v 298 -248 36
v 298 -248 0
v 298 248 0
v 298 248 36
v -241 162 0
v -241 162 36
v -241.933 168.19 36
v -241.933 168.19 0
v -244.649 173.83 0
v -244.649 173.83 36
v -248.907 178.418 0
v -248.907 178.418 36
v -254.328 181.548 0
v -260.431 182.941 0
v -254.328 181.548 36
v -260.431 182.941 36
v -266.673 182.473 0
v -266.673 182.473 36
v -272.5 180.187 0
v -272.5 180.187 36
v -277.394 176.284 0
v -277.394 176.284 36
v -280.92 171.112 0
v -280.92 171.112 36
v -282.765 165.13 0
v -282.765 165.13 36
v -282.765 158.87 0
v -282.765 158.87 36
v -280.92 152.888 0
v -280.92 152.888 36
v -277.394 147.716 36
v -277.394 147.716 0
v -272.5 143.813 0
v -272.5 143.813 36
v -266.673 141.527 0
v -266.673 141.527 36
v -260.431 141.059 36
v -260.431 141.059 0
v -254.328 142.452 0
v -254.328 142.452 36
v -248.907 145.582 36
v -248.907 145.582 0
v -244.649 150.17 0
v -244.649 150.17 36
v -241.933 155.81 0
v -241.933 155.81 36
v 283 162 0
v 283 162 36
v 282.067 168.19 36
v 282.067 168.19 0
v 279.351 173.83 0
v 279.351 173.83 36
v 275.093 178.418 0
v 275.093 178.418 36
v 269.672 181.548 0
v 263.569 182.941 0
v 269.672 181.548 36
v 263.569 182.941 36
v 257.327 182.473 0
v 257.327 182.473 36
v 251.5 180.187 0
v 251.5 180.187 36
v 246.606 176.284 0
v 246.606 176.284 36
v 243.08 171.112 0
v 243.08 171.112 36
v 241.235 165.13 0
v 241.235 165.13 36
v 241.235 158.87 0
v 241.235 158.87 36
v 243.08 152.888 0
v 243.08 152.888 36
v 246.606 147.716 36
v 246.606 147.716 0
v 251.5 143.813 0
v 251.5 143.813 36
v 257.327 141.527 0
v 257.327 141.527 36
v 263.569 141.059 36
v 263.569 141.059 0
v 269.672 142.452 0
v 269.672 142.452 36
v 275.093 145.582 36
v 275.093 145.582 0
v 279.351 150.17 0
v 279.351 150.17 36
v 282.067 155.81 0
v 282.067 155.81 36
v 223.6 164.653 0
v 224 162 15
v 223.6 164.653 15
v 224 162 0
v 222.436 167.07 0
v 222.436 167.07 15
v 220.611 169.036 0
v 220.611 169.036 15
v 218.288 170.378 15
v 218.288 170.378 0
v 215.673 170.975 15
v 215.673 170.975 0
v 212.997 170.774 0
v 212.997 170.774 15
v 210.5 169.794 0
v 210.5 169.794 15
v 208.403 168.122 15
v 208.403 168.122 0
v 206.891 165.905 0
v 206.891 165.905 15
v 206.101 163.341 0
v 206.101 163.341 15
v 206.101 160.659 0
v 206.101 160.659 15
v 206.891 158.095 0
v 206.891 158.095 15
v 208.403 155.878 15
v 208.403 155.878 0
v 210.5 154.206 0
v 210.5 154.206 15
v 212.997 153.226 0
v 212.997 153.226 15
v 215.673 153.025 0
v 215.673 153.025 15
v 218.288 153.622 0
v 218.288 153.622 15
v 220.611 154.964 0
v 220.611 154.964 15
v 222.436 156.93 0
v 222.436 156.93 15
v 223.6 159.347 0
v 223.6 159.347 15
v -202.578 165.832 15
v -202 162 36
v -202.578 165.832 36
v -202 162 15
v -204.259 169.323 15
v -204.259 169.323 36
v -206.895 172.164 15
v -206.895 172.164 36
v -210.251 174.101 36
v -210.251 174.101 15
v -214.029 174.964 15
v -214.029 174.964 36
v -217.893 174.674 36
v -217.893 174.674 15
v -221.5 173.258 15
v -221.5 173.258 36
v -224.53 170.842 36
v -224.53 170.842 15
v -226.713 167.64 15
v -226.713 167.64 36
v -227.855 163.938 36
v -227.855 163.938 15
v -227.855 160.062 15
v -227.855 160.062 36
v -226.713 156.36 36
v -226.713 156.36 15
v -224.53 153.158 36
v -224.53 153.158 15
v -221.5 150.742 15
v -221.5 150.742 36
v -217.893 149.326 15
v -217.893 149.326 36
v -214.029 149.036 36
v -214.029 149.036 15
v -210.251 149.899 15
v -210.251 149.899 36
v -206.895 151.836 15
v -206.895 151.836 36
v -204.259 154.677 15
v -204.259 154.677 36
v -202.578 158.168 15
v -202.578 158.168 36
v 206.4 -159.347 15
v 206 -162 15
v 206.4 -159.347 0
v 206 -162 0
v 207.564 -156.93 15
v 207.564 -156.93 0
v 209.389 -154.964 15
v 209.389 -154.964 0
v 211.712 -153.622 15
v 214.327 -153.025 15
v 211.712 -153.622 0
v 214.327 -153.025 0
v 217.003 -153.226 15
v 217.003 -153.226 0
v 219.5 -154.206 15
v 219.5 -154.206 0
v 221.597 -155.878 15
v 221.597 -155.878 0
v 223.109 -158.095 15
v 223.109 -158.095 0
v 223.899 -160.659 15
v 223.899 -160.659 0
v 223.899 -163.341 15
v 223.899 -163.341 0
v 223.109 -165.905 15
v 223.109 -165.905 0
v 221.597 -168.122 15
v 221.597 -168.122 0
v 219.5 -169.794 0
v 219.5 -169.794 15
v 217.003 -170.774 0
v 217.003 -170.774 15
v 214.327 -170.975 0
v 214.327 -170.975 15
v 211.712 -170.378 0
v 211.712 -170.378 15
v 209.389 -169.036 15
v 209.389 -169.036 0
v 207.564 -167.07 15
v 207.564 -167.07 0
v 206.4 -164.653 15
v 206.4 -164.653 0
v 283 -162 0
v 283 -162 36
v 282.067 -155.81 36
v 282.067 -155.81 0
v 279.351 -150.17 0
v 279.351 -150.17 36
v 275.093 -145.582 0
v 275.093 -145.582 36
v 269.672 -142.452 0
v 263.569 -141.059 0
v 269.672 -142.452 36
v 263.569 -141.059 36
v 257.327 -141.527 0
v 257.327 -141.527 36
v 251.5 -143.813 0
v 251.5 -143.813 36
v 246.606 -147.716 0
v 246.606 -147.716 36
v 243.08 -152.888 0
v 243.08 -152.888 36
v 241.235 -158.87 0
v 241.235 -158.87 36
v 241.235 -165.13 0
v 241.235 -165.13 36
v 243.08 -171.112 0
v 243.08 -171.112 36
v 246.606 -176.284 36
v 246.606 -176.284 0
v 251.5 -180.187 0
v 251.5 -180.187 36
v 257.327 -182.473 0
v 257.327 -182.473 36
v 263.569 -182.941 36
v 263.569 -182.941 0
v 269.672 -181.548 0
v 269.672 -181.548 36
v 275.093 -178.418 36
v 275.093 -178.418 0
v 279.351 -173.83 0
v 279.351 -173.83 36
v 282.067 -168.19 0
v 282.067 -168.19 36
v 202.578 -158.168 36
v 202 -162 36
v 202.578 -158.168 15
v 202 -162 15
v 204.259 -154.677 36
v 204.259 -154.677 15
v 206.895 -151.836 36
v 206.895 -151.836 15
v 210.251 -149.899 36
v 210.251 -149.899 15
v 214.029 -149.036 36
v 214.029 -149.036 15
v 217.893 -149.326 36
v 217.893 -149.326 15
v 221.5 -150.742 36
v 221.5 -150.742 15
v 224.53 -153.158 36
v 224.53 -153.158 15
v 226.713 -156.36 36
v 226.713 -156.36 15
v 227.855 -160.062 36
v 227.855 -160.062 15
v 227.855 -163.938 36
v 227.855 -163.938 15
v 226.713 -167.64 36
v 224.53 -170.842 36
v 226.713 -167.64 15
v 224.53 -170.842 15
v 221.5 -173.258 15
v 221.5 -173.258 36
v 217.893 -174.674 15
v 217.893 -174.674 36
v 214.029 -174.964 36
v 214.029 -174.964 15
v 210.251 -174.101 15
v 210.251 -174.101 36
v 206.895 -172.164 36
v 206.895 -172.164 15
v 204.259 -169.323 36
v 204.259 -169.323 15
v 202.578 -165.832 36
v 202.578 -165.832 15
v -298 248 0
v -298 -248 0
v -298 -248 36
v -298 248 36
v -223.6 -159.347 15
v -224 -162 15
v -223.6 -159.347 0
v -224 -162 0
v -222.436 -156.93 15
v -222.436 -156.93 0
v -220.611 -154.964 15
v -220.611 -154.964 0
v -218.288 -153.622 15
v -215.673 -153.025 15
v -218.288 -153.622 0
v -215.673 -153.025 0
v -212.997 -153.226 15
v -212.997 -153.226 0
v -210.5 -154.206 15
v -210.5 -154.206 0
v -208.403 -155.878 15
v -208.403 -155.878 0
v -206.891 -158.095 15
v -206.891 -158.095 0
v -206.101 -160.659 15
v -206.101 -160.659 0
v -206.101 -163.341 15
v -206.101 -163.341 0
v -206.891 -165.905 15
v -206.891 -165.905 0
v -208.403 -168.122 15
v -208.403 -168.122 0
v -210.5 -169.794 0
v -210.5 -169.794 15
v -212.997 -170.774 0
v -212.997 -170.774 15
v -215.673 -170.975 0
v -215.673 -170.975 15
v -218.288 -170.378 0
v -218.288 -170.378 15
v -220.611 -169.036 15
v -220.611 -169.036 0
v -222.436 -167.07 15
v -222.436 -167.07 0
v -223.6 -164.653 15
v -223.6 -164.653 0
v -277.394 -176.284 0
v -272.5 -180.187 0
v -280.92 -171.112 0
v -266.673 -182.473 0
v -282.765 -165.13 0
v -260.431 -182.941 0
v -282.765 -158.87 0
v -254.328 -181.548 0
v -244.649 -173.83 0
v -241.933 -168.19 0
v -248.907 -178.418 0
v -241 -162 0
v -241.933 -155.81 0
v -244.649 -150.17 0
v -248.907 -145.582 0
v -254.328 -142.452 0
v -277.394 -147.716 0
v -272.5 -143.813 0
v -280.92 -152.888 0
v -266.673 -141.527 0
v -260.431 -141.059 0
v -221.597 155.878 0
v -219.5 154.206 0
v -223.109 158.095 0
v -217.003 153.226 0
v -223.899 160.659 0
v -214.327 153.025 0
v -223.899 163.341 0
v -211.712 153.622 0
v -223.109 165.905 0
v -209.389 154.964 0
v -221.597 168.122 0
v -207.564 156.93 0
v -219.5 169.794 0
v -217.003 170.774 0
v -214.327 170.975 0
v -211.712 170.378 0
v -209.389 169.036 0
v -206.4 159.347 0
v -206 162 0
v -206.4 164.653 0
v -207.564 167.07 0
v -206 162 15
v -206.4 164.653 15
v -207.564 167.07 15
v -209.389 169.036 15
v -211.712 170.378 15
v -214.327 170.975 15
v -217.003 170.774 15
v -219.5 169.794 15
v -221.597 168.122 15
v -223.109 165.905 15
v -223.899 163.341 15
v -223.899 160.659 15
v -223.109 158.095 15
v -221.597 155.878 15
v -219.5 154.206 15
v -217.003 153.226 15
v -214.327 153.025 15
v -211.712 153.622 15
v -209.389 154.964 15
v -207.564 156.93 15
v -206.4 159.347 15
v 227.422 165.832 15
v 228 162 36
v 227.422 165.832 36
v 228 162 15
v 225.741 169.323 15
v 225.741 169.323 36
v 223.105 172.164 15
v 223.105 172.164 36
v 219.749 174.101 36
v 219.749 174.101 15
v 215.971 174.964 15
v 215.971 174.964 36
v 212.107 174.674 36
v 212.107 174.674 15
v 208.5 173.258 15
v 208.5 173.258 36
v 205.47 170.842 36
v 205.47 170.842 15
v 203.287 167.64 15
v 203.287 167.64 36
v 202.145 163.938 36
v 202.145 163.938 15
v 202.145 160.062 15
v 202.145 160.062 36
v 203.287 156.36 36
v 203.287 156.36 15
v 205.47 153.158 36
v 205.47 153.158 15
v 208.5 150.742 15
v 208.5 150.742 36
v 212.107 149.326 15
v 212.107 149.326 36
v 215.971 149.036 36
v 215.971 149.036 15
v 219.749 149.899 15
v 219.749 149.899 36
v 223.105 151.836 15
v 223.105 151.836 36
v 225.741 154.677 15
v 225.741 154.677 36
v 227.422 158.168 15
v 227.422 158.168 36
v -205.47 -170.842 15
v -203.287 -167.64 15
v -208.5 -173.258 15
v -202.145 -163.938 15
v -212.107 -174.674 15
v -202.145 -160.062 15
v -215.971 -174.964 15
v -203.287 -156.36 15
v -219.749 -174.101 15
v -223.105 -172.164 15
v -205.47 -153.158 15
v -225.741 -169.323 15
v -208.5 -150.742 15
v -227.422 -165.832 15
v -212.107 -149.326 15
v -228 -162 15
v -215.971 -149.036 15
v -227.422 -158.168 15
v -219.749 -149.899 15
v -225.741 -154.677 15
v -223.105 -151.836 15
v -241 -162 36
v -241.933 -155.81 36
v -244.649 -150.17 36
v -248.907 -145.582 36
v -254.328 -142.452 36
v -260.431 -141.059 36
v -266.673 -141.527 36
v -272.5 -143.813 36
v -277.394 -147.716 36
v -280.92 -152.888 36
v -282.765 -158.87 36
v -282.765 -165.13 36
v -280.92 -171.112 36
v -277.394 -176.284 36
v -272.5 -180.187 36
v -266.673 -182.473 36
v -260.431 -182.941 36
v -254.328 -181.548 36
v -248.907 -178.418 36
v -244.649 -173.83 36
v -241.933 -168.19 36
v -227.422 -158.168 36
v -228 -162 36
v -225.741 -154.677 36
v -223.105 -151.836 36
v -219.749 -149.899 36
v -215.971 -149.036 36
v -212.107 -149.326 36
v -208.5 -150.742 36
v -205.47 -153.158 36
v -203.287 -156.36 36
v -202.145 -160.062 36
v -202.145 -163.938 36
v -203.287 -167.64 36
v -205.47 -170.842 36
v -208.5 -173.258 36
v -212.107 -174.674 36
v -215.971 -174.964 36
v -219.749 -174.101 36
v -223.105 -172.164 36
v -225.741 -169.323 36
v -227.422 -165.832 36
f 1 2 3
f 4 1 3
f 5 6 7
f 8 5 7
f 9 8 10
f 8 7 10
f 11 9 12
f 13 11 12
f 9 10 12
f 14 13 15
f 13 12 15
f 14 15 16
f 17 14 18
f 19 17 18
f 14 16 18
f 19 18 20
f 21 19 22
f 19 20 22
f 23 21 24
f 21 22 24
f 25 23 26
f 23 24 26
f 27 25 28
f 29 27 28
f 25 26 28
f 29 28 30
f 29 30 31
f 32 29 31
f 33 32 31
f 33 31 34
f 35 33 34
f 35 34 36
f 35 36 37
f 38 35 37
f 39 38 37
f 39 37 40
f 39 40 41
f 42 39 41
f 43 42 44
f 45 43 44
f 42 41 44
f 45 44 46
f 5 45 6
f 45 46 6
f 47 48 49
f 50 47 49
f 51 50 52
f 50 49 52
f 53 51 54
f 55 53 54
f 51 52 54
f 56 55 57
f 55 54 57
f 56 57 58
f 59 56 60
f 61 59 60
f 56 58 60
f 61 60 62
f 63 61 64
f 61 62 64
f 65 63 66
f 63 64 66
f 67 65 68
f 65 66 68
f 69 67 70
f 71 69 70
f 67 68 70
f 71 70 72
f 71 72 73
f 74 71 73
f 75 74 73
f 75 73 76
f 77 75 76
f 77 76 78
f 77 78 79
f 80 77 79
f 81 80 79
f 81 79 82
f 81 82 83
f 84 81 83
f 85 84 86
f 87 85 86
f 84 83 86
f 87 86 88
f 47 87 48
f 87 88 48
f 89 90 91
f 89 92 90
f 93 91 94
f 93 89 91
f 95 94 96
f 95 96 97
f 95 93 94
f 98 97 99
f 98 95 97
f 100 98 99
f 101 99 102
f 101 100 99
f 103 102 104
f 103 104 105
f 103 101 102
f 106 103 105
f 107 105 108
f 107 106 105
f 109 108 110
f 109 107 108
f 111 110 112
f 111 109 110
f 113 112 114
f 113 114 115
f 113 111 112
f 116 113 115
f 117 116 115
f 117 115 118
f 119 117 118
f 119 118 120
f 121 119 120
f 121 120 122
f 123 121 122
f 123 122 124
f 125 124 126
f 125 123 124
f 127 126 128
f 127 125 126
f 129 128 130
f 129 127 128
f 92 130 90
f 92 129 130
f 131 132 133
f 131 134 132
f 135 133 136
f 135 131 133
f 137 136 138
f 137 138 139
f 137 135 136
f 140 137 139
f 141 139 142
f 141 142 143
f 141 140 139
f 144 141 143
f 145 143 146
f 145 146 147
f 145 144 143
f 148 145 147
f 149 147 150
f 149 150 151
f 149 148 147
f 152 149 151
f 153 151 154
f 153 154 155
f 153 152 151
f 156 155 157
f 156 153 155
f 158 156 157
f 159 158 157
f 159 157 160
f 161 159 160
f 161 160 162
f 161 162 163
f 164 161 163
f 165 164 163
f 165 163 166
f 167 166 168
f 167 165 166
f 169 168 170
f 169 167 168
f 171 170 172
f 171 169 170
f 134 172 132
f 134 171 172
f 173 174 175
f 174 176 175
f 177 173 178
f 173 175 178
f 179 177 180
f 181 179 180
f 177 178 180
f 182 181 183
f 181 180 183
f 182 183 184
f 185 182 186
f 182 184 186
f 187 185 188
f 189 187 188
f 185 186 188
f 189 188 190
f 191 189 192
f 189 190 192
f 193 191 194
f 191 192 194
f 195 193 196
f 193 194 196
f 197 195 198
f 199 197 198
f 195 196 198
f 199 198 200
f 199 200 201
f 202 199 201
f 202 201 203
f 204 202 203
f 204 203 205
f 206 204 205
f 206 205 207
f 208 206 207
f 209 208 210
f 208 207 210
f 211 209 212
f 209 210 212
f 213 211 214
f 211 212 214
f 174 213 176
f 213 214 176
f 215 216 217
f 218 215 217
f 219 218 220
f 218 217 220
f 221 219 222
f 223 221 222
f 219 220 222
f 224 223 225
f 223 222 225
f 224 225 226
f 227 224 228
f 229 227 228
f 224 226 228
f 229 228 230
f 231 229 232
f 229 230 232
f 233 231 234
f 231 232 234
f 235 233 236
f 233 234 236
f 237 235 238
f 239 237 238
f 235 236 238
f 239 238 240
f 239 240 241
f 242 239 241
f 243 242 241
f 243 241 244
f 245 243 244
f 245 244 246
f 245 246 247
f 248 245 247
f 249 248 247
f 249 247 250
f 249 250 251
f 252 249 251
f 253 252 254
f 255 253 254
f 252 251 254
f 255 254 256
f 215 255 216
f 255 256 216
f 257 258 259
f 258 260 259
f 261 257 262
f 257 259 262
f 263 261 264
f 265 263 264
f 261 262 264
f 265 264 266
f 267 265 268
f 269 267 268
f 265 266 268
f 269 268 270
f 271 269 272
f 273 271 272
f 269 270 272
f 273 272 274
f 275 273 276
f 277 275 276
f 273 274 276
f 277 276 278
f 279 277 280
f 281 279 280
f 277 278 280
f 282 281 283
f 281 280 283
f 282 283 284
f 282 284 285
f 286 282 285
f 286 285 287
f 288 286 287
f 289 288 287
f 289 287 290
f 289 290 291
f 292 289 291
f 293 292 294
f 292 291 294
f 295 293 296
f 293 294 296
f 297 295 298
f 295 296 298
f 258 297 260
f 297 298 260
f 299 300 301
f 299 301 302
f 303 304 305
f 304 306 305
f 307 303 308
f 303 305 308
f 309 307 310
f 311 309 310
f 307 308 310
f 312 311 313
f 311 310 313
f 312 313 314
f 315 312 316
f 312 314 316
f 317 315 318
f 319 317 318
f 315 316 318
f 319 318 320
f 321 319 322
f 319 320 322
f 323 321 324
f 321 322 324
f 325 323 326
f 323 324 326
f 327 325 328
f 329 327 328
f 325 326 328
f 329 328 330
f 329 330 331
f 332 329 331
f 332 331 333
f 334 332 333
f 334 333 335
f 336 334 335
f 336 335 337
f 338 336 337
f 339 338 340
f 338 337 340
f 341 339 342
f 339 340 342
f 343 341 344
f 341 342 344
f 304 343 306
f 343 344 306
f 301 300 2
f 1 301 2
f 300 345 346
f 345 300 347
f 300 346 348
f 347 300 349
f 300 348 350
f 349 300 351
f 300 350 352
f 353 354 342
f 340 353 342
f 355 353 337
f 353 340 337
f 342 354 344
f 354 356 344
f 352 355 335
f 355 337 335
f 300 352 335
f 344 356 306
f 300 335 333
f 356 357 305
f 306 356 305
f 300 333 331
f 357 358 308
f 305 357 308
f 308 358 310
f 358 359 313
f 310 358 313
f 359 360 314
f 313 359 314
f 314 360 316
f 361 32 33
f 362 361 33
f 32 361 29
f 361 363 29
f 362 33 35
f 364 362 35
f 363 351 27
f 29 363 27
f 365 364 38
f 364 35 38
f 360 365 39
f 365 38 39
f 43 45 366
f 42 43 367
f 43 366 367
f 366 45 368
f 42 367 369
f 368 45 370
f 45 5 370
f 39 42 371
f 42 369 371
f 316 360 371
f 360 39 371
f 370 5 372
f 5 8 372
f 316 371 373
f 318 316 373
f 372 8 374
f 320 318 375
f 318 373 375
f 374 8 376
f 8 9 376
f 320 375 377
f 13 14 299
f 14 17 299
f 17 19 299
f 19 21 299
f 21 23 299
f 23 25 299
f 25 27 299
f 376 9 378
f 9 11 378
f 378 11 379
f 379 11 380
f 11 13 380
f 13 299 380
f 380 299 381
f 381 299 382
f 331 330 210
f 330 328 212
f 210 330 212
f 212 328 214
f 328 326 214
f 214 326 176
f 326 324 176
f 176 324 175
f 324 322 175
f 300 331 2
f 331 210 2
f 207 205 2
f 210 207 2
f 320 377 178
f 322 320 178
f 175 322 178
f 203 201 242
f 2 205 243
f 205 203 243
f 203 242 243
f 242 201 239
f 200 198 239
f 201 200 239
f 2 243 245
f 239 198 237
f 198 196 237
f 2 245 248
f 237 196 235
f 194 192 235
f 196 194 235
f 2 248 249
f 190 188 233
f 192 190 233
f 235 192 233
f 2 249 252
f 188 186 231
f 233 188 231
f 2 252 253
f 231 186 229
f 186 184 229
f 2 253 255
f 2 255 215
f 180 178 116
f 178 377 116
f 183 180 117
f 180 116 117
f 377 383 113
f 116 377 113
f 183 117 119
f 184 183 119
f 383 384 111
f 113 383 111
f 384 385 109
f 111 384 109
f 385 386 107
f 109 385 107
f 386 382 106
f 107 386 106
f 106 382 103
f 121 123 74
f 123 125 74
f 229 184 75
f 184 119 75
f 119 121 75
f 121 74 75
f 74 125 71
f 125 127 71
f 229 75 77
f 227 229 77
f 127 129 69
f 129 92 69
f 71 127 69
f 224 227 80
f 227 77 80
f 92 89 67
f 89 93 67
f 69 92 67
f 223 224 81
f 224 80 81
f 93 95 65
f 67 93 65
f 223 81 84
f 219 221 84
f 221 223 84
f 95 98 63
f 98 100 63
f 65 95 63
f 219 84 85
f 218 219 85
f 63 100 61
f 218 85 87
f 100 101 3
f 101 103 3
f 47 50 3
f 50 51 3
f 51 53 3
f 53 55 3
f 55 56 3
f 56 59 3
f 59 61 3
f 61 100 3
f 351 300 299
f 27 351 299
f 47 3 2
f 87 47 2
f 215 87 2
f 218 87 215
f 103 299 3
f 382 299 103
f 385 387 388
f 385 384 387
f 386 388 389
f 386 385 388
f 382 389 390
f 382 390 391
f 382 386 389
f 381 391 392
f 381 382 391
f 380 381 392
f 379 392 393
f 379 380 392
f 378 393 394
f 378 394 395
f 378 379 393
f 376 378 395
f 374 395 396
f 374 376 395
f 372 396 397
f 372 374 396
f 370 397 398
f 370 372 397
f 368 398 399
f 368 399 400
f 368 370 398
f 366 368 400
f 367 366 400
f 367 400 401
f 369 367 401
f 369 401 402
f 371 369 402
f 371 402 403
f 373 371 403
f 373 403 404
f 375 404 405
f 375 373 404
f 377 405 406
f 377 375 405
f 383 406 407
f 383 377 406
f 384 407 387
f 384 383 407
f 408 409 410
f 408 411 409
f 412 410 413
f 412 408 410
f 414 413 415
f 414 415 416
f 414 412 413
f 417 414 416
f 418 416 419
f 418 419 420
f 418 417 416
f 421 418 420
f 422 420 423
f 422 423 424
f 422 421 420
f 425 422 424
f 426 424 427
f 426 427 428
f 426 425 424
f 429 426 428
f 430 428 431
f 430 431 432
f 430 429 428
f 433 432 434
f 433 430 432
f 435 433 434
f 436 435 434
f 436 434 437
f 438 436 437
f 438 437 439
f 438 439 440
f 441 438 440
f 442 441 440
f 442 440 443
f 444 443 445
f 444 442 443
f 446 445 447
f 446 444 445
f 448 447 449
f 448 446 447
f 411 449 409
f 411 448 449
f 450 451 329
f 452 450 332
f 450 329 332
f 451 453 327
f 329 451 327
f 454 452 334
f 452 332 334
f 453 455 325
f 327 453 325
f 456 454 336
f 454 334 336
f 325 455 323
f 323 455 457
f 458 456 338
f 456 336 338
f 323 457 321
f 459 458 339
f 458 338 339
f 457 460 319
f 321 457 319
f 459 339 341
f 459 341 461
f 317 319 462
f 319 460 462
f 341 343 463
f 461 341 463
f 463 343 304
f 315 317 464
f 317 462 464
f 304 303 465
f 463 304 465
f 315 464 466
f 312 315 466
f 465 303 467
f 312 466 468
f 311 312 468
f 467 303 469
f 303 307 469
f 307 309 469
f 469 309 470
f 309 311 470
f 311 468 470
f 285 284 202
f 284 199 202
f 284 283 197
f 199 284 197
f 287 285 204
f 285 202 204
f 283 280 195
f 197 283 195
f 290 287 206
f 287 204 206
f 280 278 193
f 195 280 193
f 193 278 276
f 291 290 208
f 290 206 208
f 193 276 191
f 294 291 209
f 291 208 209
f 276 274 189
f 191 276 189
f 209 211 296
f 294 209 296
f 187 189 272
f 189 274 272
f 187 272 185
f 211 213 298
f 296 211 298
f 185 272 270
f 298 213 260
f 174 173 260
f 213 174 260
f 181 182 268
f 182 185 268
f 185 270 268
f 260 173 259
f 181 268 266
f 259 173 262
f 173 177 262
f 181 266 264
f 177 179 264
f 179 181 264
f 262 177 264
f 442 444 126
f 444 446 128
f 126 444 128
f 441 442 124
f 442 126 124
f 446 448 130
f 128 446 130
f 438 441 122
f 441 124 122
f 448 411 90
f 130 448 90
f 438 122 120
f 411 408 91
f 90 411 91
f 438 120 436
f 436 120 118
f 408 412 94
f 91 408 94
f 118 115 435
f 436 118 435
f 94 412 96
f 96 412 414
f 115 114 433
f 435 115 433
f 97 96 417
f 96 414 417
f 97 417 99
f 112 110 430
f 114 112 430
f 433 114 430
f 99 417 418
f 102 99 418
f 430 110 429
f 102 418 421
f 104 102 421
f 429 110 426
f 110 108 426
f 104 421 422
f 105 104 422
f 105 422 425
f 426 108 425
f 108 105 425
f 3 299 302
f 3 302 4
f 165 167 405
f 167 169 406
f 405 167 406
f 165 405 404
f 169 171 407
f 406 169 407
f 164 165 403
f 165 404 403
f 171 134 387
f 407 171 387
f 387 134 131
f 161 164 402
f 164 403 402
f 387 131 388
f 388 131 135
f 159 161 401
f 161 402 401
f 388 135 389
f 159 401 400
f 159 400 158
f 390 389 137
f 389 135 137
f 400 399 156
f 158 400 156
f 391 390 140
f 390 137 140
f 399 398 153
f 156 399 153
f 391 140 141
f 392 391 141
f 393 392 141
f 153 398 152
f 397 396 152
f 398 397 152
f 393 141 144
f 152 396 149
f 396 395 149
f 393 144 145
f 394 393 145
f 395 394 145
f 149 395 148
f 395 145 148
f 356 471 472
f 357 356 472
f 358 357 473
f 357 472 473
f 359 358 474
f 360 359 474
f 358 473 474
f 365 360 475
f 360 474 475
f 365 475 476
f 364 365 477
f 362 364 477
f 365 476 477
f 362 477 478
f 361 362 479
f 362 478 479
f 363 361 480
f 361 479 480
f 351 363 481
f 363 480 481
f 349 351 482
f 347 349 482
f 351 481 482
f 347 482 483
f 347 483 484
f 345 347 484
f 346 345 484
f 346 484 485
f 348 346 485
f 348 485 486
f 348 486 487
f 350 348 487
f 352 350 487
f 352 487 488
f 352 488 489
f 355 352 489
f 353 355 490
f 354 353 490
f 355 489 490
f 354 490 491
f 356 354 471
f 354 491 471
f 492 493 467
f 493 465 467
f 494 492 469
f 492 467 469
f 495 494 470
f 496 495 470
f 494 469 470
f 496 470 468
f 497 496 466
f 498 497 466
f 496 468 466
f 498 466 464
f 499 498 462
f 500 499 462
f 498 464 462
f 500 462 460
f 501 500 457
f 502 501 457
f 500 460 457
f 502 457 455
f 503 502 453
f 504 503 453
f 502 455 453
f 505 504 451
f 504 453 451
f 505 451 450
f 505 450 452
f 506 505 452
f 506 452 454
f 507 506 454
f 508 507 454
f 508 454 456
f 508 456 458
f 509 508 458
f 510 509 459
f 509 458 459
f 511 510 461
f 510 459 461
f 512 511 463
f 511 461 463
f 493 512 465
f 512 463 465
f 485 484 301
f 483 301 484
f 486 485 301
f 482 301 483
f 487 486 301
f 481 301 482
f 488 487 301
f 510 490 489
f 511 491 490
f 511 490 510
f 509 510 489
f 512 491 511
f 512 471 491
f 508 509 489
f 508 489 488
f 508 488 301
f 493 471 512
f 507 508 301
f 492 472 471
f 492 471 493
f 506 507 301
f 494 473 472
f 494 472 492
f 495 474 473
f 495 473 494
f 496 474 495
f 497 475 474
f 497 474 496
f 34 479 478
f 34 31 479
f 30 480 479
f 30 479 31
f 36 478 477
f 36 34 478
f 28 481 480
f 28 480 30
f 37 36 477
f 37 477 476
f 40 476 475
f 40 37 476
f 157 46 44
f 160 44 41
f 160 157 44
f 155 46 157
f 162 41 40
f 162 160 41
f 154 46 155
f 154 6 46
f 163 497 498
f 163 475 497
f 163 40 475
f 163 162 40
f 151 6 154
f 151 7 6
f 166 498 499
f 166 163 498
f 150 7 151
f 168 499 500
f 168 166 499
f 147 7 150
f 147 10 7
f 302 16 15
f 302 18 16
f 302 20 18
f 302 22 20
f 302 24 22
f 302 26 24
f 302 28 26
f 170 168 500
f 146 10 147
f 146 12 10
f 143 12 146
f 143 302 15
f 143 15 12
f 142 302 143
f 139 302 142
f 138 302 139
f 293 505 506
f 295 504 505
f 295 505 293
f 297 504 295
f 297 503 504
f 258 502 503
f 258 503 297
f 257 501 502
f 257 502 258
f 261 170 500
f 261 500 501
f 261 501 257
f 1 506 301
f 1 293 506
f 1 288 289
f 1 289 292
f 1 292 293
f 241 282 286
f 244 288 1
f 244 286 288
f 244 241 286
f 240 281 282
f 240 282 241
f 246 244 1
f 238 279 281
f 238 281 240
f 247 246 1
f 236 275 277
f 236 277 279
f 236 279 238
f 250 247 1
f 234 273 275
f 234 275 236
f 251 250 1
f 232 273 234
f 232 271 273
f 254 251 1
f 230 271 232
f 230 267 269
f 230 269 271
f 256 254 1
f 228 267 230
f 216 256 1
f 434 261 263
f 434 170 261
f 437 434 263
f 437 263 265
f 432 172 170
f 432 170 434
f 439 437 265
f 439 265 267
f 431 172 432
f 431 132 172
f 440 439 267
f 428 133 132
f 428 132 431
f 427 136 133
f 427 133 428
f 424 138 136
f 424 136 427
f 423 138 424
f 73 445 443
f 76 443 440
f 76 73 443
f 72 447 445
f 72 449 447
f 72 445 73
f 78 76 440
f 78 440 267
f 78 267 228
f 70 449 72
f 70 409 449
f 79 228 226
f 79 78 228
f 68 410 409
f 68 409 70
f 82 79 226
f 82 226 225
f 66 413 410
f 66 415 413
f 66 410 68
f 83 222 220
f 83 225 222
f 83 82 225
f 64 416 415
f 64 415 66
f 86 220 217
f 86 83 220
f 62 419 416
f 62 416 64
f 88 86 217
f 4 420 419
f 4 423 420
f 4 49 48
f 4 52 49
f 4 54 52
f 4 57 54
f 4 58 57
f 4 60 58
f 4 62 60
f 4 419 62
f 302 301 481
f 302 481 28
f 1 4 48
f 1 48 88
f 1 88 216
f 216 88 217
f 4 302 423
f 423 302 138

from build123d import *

# Parameters (mm, degrees)
SZKIC1_W                    = 596
SZKIC1_H                    = 496
DODANIE_WYCI_GNI_CIE1_DEPTH = 36
SZKIC2_R                    = 21
WYTNIJ_WYCI_GNI_CIE1_DEPTH  = 36
SZKIC3_R                    = 21
WYTNIJ_WYCI_GNI_CIE2_DEPTH  = 36
SZKIC4_R                    = 21
WYTNIJ_WYCI_GNI_CIE3_DEPTH  = 36
SZKIC5_R                    = 21
WYTNIJ_WYCI_GNI_CIE4_DEPTH  = 36
SZKIC6_W                    = 15
SZKIC6_H                    = 9
SZKIC7_W                    = 15
SZKIC7_H                    = 9
SZKIC8_W                    = 15
SZKIC8_H                    = 9
SZKIC9_W                    = 15
SZKIC9_H                    = 9
SZKIC10_W                   = 21
SZKIC10_H                   = 13
SZKIC11_W                   = 21
SZKIC11_H                   = 13
SZKIC12_W                   = 21
SZKIC12_H                   = 13
SZKIC13_W                   = 21
SZKIC13_H                   = 13


with BuildPart() as part:
    # Szkic1 → Dodanie-wyciągnięcie1 (new body)
    with BuildSketch(Plane.XY):
        Rectangle(SZKIC1_W, SZKIC1_H)
    extrude(amount=DODANIE_WYCI_GNI_CIE1_DEPTH)

    # Szkic2 → Wytnij-wyciągnięcie1 (cut)
    with BuildSketch(Plane.XY.offset(36)):
        with Locations((262, 162)):
            Circle(SZKIC2_R)
    extrude(amount=-WYTNIJ_WYCI_GNI_CIE1_DEPTH, mode=Mode.SUBTRACT)

    # Szkic3 → Wytnij-wyciągnięcie2 (cut)
    with BuildSketch(Plane.XY.offset(36)):
        with Locations((262, -162)):
            Circle(SZKIC3_R)
    extrude(amount=-WYTNIJ_WYCI_GNI_CIE2_DEPTH, mode=Mode.SUBTRACT)

    # Szkic4 → Wytnij-wyciągnięcie3 (cut)
    with BuildSketch(Plane.XY.offset(36)):
        with Locations((-262, -162)):
            Circle(SZKIC4_R)
    extrude(amount=-WYTNIJ_WYCI_GNI_CIE3_DEPTH, mode=Mode.SUBTRACT)

    # Szkic5 → Wytnij-wyciągnięcie4 (cut)
    with BuildSketch(Plane.XY.offset(36)):
        with Locations((-262, 162)):
            Circle(SZKIC5_R)
    extrude(amount=-WYTNIJ_WYCI_GNI_CIE4_DEPTH, mode=Mode.SUBTRACT)

    # Szkic6 → Wycięcie-obrót1 (revolve, cut)
    with BuildSketch(Plane(origin=(215, 0, 0), x_dir=(0, 0, -1), z_dir=(1, 0, 0))):
        with Locations((-7.5, 166.5)):
            Rectangle(SZKIC6_W, SZKIC6_H)
    revolve(axis=Axis((215, 162, 0), (0, 0, 1)), mode=Mode.SUBTRACT)

    # Szkic7 → Wycięcie-obrót2 (revolve, cut)
    with BuildSketch(Plane(origin=(215, 0, 0), x_dir=(0, 0, -1), z_dir=(1, 0, 0))):
        with Locations((-7.5, -166.5)):
            Rectangle(SZKIC7_W, SZKIC7_H)
    revolve(axis=Axis((215, -162, 15), (0, 0, -1)), mode=Mode.SUBTRACT)

    # Szkic8 → Wycięcie-obrót3 (revolve, cut)
    with BuildSketch(Plane(origin=(-215, 0, 0), x_dir=(0, 0, -1), z_dir=(1, 0, 0))):
        with Locations((-7.5, 166.5)):
            Rectangle(SZKIC8_W, SZKIC8_H)
    revolve(axis=Axis((-215, 162, 0), (0, 0, 1)), mode=Mode.SUBTRACT)

    # Szkic9 → Wycięcie-obrót4 (revolve, cut)
    with BuildSketch(Plane(origin=(-215, 0, 0), x_dir=(0, 0, -1), z_dir=(1, 0, 0))):
        with Locations((-7.5, -166.5)):
            Rectangle(SZKIC9_W, SZKIC9_H)
    revolve(axis=Axis((-215, -162, 15), (0, 0, -1)), mode=Mode.SUBTRACT)

    # Szkic10 → Wycięcie-obrót5 (revolve, cut)
    with BuildSketch(Plane(origin=(215, 0, 0), x_dir=(0, 0, -1), z_dir=(1, 0, 0))):
        with Locations((-25.5, 168.5)):
            Rectangle(SZKIC10_W, SZKIC10_H)
    revolve(axis=Axis((215, 162, 15), (0, 0, 1)), mode=Mode.SUBTRACT)

    # Szkic11 → Wycięcie-obrót6 (revolve, cut)
    with BuildSketch(Plane(origin=(215, 0, 0), x_dir=(0, 0, -1), z_dir=(1, 0, 0))):
        with Locations((-25.5, -168.5)):
            Rectangle(SZKIC11_W, SZKIC11_H)
    revolve(axis=Axis((215, -162, 36), (0, 0, -1)), mode=Mode.SUBTRACT)

    # Szkic12 → Wycięcie-obrót7 (revolve, cut)
    with BuildSketch(Plane(origin=(-215, 0, 0), x_dir=(0, 0, -1), z_dir=(1, 0, 0))):
        with Locations((-25.5, -168.5)):
            Rectangle(SZKIC12_W, SZKIC12_H)
    revolve(axis=Axis((-215, -162, 36), (0, 0, -1)), mode=Mode.SUBTRACT)

    # Szkic13 → Wycięcie-obrót8 (revolve, cut)
    with BuildSketch(Plane(origin=(-215, 0, 0), x_dir=(0, 0, -1), z_dir=(1, 0, 0))):
        with Locations((-25.5, 168.5)):
            Rectangle(SZKIC13_W, SZKIC13_H)
    revolve(axis=Axis((-215, 162, 15), (0, 0, 1)), mode=Mode.SUBTRACT)


solid = part.part
